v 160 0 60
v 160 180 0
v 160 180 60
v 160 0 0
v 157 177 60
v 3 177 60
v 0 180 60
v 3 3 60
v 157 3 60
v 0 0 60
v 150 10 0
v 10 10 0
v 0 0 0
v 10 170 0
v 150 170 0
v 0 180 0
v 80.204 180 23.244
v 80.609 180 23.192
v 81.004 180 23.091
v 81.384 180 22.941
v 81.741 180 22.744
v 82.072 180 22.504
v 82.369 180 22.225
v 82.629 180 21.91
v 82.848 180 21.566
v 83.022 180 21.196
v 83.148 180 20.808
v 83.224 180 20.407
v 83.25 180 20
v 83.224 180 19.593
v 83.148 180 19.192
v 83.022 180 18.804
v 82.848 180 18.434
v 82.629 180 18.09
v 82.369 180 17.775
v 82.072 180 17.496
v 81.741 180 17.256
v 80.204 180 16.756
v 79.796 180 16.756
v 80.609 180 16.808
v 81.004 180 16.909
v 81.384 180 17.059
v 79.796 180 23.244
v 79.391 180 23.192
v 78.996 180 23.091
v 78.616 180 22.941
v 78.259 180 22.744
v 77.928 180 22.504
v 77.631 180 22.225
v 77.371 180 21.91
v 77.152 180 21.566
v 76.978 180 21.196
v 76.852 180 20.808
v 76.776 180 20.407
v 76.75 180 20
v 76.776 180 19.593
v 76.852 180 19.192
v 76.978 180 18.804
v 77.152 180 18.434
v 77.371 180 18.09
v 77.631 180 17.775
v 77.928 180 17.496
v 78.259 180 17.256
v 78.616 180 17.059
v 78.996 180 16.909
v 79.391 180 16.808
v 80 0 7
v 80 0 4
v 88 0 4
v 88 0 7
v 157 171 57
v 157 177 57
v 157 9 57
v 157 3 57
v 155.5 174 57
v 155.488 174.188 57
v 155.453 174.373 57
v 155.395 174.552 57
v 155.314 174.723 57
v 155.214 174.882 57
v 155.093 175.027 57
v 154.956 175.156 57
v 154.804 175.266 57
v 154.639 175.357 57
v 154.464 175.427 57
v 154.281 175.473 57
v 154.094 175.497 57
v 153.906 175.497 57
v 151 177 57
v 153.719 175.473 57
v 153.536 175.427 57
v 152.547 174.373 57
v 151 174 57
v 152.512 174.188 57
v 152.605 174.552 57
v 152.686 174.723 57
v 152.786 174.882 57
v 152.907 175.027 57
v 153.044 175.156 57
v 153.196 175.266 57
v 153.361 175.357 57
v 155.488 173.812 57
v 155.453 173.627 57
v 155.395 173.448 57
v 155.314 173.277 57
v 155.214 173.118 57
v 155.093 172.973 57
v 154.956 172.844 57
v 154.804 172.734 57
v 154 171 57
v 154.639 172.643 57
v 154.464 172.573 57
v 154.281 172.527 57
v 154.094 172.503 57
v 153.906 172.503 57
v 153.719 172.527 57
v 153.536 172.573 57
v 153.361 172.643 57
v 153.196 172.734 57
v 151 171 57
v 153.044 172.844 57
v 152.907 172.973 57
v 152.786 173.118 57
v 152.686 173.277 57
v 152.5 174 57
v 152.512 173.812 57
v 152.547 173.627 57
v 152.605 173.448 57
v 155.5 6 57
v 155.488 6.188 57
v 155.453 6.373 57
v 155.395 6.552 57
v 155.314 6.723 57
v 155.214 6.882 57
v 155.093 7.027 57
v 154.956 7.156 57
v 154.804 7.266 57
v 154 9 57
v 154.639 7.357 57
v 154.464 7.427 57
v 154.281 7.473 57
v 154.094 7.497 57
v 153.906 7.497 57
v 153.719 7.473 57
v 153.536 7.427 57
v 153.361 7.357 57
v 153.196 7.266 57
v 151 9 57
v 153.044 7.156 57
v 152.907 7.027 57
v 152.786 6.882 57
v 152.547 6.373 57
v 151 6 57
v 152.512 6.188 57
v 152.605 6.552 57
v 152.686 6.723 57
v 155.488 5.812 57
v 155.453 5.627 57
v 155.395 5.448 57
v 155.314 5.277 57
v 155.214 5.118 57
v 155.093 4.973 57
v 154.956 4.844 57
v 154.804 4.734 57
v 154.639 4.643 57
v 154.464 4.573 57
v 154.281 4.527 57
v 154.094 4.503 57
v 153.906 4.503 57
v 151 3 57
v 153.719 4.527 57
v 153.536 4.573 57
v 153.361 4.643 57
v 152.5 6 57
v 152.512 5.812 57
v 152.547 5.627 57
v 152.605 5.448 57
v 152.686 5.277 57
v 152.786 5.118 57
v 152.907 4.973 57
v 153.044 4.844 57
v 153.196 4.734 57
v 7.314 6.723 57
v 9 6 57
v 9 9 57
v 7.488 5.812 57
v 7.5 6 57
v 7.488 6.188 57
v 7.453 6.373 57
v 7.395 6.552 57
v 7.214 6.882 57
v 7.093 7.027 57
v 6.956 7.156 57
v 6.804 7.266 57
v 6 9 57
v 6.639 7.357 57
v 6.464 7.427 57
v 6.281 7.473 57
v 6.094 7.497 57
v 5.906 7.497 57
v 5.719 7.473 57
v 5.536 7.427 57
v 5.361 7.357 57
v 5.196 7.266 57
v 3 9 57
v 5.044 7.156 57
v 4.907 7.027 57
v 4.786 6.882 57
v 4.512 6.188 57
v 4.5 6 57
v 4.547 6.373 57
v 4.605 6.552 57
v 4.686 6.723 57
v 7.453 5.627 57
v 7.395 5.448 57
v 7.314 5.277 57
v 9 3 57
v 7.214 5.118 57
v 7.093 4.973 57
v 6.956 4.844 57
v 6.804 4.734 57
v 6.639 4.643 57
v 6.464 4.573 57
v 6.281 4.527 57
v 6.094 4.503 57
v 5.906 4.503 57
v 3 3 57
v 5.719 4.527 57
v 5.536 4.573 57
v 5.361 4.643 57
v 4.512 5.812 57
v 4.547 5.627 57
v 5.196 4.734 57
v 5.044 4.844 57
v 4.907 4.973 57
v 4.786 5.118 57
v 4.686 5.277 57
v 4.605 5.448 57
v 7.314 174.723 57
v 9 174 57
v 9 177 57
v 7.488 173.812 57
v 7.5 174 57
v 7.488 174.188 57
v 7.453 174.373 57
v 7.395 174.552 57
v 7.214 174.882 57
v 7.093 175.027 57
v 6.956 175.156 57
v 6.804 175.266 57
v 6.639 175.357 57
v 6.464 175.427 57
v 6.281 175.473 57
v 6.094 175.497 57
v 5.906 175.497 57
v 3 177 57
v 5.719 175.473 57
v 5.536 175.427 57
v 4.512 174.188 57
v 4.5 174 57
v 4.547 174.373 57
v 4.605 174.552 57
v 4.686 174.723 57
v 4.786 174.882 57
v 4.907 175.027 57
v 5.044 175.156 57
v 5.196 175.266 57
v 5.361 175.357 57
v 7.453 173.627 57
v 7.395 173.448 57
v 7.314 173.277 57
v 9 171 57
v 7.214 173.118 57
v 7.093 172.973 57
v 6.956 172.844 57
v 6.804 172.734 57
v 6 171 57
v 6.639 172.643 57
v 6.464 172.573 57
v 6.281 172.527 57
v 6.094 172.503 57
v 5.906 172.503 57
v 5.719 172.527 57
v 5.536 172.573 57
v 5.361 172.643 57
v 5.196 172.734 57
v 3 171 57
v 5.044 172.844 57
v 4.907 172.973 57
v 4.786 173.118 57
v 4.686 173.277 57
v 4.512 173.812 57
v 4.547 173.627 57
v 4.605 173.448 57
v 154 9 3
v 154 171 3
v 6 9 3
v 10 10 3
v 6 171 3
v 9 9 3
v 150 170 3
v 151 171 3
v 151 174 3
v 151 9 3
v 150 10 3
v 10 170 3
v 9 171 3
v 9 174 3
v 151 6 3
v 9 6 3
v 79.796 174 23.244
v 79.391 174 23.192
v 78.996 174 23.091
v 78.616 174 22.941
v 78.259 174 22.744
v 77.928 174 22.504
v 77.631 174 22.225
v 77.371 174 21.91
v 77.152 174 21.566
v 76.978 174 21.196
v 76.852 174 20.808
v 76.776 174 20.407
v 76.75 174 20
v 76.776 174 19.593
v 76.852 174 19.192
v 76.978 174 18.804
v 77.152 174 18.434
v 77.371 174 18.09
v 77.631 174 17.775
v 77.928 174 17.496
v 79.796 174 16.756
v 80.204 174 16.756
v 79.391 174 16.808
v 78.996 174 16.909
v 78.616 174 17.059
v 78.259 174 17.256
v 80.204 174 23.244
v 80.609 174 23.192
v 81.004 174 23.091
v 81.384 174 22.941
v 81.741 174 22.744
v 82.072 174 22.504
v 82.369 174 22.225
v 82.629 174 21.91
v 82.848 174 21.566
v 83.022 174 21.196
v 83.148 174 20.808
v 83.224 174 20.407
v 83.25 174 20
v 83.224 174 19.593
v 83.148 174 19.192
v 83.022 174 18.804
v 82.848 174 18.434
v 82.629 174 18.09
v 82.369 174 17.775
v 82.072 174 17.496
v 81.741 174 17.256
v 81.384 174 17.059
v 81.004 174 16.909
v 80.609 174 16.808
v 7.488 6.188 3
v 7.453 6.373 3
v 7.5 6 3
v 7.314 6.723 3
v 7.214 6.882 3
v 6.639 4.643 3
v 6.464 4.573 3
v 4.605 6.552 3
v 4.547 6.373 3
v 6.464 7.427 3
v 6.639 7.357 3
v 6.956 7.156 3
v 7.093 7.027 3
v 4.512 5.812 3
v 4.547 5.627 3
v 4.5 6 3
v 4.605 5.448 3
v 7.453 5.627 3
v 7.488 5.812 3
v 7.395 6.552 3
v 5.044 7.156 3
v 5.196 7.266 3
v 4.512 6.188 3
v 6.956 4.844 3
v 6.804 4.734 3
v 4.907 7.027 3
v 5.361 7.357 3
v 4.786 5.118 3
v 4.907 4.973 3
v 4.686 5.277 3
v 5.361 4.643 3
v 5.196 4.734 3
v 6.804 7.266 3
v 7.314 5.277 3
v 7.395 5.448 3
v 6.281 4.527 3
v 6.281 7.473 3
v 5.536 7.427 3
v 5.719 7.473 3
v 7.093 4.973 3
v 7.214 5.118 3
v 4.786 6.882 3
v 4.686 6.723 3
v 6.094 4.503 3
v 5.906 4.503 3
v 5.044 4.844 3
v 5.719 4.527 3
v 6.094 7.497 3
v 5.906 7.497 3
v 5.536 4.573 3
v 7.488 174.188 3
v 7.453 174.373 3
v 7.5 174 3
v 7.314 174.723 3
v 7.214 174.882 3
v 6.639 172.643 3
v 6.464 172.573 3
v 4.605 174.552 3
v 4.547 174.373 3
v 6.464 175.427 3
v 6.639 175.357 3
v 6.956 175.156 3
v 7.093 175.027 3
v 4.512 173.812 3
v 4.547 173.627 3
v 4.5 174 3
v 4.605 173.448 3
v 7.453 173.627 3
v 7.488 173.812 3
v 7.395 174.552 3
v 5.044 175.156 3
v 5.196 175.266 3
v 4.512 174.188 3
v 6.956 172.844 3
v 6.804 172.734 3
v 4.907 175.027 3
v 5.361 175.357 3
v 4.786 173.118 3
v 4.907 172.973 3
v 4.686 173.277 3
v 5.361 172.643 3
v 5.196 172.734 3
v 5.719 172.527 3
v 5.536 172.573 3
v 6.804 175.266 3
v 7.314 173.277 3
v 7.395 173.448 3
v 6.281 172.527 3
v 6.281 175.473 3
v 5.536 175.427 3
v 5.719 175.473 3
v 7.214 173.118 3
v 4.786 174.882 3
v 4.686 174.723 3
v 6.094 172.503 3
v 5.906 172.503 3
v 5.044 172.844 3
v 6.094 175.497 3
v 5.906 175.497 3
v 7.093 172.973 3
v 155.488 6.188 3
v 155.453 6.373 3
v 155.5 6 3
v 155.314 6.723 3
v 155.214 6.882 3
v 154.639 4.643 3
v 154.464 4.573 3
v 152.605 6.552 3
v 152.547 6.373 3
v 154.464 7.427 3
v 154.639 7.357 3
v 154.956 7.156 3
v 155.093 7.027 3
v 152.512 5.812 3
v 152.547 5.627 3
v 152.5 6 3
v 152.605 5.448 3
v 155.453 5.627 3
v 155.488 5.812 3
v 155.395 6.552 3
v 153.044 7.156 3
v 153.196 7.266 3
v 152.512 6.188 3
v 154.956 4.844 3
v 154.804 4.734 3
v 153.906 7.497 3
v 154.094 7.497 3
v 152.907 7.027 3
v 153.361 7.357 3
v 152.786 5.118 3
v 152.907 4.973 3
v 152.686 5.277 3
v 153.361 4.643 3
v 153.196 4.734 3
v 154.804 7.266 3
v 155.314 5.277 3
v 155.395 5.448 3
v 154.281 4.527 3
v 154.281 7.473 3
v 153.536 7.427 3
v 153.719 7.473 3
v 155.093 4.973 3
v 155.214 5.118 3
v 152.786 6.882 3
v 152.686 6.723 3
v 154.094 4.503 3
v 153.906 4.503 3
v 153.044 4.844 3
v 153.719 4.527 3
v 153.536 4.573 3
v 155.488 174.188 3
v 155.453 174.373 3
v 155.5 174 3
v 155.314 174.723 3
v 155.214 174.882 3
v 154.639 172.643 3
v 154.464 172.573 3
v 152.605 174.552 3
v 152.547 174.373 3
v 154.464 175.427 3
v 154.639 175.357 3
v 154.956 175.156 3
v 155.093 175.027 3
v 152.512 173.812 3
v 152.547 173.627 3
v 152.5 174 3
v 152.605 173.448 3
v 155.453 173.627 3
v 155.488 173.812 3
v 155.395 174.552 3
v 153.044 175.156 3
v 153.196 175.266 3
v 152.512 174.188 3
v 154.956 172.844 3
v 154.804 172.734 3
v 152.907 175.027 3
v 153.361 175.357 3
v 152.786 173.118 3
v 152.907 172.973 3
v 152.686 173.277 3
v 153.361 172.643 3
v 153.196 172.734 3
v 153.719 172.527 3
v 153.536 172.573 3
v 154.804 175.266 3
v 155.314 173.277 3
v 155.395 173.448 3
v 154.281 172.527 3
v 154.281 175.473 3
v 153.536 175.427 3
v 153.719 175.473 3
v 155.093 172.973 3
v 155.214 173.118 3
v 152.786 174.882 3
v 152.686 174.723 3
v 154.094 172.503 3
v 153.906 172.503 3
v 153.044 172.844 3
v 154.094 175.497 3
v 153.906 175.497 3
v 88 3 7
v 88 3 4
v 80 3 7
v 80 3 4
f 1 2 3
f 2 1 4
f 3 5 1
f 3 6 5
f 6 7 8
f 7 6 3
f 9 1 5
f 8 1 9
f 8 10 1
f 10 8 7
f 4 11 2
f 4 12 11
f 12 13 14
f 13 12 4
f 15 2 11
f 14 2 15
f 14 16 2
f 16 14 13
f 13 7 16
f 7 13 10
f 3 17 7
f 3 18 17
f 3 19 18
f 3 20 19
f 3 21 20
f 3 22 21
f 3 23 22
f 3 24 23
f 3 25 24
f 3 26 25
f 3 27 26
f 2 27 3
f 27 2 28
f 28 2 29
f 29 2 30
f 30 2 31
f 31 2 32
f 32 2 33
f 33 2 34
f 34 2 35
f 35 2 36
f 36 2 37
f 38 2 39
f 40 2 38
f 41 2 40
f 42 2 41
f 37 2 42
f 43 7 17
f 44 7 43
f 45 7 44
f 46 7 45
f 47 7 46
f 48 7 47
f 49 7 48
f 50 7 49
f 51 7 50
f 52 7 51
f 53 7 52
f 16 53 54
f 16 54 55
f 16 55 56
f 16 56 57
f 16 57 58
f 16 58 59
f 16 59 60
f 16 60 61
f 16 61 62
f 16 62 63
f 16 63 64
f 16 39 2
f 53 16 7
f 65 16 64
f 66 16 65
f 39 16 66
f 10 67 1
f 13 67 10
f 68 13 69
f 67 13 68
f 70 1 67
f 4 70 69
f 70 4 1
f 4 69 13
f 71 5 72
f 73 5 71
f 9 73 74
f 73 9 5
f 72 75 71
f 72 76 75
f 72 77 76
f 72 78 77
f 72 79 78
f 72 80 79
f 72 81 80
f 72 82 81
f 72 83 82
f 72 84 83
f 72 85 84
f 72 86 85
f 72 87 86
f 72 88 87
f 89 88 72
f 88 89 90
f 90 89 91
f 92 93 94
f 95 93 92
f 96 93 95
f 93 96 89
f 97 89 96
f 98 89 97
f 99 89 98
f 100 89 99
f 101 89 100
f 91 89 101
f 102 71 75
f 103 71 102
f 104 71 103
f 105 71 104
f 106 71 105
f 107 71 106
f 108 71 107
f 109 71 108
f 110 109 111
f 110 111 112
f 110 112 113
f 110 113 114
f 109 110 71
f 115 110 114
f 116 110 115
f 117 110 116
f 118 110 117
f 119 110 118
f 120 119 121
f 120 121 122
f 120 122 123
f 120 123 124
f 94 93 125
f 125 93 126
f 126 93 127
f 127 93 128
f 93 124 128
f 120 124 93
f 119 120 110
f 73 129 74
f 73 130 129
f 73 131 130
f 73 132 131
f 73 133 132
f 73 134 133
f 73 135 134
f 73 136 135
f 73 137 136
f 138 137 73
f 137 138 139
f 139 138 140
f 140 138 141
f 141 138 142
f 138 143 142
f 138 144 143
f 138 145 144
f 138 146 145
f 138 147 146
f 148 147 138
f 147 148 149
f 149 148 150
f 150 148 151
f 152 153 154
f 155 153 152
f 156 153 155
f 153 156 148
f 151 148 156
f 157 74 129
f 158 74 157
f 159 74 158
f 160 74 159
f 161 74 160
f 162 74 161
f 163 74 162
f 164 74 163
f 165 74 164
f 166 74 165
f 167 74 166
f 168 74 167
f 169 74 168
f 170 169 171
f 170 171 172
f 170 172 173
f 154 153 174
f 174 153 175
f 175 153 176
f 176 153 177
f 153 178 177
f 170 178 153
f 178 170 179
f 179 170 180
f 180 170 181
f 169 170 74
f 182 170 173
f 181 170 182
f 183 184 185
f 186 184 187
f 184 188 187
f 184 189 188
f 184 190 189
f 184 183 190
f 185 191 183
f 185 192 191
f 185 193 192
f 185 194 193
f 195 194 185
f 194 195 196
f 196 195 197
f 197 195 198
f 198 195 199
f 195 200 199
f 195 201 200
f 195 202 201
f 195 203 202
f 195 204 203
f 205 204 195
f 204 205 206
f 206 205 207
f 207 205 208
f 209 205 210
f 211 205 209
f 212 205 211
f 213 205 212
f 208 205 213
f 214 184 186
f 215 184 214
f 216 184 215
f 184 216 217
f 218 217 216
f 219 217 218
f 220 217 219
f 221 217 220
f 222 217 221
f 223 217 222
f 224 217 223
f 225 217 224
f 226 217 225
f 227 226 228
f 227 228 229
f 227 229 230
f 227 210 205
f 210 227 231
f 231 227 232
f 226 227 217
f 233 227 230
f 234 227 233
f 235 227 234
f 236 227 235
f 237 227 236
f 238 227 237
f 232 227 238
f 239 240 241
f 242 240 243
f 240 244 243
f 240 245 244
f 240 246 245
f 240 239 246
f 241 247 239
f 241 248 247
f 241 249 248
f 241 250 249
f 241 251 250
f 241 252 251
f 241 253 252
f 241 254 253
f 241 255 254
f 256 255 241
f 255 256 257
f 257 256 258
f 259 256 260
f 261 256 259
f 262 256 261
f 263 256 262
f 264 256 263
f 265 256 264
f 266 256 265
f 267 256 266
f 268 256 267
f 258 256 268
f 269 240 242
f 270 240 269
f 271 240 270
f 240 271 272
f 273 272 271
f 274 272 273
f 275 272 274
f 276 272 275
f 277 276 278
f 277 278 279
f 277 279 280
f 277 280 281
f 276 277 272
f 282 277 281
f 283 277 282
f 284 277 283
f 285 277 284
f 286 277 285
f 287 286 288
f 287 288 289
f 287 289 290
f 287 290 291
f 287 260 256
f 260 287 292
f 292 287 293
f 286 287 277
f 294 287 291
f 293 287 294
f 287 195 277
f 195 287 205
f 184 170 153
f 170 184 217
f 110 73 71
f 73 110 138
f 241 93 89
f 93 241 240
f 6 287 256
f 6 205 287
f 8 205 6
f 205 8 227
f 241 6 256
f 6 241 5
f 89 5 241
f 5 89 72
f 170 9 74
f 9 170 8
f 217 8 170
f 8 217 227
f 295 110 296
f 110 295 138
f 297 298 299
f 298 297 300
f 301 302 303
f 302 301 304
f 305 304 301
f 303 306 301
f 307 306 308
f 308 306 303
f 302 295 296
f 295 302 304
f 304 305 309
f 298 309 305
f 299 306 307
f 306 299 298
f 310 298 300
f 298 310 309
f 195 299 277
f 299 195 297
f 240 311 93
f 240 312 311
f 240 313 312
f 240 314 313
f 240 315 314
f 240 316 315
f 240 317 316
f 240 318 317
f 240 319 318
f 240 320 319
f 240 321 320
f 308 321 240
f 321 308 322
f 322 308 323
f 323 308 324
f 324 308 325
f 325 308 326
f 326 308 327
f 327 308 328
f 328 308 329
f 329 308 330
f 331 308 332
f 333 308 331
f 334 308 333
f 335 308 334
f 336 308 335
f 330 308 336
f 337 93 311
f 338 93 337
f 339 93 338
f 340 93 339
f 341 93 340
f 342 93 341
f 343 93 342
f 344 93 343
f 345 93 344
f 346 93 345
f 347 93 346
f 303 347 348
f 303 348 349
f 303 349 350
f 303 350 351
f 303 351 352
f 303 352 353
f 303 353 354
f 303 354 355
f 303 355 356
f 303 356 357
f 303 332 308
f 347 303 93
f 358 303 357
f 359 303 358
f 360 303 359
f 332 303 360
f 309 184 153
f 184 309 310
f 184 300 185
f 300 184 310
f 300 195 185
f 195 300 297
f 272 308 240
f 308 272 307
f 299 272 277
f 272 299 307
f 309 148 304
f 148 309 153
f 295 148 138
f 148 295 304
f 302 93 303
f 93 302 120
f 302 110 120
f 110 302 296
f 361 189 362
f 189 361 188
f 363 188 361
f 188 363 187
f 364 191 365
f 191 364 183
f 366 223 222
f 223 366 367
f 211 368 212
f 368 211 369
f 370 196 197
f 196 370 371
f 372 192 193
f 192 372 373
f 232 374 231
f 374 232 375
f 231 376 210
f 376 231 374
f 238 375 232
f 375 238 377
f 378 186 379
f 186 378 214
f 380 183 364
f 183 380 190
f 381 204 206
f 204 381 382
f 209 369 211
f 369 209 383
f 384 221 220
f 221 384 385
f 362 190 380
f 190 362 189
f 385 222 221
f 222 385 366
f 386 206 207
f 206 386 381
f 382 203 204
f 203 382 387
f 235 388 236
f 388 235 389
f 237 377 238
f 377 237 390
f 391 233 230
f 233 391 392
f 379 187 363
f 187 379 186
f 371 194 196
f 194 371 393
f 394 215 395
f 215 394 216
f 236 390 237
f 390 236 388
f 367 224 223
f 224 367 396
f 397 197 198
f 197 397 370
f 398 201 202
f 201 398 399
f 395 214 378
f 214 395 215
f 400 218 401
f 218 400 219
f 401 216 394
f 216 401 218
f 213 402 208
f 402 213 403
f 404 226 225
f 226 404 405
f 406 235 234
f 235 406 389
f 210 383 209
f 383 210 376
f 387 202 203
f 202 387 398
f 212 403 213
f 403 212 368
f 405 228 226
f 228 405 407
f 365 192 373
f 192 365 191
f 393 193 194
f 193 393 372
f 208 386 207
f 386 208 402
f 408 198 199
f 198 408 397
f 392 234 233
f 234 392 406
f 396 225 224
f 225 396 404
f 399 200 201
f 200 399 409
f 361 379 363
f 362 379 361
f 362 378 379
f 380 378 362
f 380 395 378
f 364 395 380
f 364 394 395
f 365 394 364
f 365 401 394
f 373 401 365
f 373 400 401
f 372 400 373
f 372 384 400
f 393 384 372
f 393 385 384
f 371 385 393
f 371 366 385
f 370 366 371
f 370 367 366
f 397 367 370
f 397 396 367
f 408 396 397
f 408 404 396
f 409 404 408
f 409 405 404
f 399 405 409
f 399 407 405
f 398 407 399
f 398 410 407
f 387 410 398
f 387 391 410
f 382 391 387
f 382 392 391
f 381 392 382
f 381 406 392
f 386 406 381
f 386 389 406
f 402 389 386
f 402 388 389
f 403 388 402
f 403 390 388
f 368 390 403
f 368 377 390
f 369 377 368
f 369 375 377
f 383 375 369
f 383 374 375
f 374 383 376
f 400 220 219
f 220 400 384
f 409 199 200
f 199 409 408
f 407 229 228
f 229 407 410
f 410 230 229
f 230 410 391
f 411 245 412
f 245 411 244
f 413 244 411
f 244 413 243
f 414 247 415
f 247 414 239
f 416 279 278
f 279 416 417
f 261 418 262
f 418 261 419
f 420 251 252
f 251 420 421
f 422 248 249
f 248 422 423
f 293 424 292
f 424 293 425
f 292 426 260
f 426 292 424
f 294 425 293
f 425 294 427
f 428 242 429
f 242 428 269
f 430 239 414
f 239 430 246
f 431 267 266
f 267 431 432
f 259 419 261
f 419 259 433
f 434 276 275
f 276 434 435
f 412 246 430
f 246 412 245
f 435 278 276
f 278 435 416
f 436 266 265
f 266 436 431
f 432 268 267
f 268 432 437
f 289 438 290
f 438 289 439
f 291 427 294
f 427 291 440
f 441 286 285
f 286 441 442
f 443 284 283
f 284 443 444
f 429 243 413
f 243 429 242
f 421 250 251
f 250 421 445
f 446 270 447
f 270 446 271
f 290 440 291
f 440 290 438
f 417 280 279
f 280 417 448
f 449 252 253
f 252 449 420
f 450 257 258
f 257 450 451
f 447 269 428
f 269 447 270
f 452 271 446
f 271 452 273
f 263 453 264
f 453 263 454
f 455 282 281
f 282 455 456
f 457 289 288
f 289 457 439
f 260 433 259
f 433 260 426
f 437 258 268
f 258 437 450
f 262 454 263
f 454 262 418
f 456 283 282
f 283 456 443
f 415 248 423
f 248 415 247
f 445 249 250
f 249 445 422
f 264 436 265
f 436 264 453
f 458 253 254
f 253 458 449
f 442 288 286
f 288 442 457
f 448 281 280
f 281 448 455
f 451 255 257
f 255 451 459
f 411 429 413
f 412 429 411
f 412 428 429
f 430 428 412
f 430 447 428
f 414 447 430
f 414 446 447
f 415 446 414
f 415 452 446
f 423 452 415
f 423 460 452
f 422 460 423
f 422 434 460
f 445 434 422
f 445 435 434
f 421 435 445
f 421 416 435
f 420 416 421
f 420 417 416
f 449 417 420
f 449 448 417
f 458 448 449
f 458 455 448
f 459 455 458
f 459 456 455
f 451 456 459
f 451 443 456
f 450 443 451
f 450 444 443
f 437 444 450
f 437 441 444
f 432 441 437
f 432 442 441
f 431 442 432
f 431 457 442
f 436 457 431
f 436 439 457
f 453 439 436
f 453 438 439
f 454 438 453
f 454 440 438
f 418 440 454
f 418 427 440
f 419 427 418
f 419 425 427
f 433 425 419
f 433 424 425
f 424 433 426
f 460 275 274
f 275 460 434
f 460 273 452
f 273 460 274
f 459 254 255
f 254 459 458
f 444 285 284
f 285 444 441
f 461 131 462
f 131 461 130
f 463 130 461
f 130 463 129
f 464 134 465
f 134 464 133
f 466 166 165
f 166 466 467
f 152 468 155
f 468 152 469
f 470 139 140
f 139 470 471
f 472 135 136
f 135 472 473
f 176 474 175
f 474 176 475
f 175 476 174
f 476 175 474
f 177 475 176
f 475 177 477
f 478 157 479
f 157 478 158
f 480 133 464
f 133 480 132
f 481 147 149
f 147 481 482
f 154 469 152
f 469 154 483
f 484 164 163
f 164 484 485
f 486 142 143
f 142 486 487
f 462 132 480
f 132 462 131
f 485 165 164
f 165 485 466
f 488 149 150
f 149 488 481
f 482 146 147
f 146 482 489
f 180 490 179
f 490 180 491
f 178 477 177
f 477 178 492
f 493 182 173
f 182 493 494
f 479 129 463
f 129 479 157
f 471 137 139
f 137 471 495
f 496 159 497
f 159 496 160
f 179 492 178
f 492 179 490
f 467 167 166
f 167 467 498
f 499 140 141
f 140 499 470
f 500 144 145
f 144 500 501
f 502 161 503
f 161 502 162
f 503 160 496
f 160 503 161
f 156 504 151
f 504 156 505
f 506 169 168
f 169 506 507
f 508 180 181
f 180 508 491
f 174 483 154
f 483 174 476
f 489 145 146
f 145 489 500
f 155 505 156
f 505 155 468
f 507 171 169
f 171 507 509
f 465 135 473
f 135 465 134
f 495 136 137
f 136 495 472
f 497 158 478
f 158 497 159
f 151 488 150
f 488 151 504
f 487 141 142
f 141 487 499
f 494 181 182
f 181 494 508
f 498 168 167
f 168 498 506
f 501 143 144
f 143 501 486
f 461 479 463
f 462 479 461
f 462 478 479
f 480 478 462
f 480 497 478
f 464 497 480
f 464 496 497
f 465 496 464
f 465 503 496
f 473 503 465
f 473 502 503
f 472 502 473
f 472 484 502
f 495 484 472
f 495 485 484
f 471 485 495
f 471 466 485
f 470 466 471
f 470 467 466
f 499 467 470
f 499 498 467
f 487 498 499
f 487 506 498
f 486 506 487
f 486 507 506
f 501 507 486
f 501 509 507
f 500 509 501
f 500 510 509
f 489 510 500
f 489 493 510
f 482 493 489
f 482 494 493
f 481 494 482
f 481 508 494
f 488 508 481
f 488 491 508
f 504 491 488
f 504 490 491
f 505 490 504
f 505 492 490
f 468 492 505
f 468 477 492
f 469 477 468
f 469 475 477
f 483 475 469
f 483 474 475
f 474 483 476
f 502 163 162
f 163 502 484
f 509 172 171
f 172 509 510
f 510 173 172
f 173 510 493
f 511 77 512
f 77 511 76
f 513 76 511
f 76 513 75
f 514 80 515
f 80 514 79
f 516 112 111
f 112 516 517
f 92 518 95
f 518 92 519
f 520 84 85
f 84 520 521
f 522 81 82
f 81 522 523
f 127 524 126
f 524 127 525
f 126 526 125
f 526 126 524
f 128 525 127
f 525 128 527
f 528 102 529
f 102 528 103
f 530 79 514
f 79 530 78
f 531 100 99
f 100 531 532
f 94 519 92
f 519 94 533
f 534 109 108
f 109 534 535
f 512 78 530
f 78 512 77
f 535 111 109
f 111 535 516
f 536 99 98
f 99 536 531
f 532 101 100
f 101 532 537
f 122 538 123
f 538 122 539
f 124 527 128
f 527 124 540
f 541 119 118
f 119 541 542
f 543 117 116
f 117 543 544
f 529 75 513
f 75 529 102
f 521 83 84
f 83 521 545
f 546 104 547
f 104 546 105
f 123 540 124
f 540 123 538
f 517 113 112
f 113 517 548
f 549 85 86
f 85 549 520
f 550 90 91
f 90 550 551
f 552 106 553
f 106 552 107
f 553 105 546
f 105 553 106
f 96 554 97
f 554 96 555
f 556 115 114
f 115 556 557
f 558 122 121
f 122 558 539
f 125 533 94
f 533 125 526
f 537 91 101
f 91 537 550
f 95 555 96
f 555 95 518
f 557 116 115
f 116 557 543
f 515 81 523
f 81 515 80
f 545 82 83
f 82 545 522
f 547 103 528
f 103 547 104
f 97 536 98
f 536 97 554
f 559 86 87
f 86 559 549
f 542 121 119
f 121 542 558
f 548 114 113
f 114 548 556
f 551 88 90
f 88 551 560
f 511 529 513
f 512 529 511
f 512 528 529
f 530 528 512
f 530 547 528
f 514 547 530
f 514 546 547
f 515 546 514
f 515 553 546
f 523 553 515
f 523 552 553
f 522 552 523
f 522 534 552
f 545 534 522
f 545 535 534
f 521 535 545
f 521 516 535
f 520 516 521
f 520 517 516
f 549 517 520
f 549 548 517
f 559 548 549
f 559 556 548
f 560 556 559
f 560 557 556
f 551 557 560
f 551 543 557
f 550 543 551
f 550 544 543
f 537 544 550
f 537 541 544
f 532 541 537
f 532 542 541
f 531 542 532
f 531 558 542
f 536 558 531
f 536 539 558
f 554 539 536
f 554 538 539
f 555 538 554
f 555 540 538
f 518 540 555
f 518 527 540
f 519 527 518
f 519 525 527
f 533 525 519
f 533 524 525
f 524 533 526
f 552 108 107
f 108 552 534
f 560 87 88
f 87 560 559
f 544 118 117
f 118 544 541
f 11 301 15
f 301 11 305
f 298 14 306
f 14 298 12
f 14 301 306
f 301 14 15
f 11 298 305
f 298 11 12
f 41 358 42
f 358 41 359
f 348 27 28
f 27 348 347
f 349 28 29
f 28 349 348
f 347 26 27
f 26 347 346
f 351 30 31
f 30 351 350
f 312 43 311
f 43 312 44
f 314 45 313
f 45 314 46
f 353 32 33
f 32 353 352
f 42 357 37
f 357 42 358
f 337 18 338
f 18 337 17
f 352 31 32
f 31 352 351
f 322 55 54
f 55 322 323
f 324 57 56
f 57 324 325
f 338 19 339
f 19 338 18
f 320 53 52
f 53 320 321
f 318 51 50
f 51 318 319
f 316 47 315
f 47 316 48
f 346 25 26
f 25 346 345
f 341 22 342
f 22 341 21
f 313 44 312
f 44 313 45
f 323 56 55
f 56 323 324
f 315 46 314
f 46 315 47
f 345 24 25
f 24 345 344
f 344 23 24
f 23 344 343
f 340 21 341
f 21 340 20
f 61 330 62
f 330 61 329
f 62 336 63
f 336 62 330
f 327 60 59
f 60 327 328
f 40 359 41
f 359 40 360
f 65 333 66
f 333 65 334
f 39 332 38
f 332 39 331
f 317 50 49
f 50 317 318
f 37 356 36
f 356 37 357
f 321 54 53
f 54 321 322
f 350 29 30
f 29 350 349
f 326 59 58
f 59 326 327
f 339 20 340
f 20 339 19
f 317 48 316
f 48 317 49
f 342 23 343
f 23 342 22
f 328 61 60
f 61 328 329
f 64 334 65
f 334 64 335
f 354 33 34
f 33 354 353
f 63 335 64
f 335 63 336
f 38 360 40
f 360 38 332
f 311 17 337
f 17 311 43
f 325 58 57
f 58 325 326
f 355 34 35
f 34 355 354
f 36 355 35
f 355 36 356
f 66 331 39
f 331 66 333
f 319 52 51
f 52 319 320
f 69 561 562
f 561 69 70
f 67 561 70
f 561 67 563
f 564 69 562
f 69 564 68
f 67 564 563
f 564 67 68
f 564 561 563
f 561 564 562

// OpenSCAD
// file: constants.scad
//------------------------------------------------------------------------------
// constants.scad -- global and cross-file constants.
//
// _xx: width
// _yy: depth
// _zz: height
// _dd: diameter
//
// This is part of the ArrBot EastBay Transmitter project.
// https://github.com/marhar/eastbay-transmitter
// Copyright (c) 2020 Google LLC
//------------------------------------------------------------------------------

$fn=50;

box_xx = 160;            // main box
box_yy = 180;
box_zz = 60;
wall = 3;

post_wid = 6;

plate_zz = 3;

screw3a_dd = 3.0;       // mounting screw
screw3b_dd = 3.2;

button_dd = 8.1;        // hole size for button
switch_dd = 8.1;        // hole size for switch and button

power_dd = 12;          // power switch

antenna_dd = 44;        // antenna_hole (TODO);
// main file
//------------------------------------------------------------------------------
// case.scad -- main transmitter box.
//
// This is part of the ArrBot EastBay Transmitter project.
// https://github.com/marhar/eastbay-transmitter
// Copyright (c) 2020 Google LLC
//------------------------------------------------------------------------------

include <constants.scad>

module post(hh) {
  // post for screwing faceplace onto case.
  cube([post_wid, post_wid, hh]);
}
module posthole(hh) {
  // screwhole for post.
  translate([post_wid/2,post_wid/2,0]) cylinder(hh, d=screw3a_dd);
}

module case() {
  // main case without sideholes.
  difference() {
    union() {
      difference() {
        cube([box_xx, box_yy, box_zz]);
        translate([wall,wall,box_zz-plate_zz]) cube([box_xx-2*wall,box_yy-2*wall,plate_zz]);
        translate([wall*2,wall*2,wall]) cube([box_xx-4*wall,box_yy-4*wall,box_zz-wall]);
      }
      // posts
      for (i=[wall,box_xx-wall-post_wid], j=[wall,box_yy-wall-post_wid]) {
        translate([i,j,wall]) post(box_zz-wall-plate_zz);
      }
    }
    //post holes
    for (i=[wall,box_xx-wall-post_wid], j=[wall,box_yy-wall-post_wid]) {
      translate([i,j,wall]) posthole(box_zz-wall-plate_zz);
    }
    // cutout on bottom for quicker prototype printing.  Comment out for final.
    translate([10,10,0]) cube([box_xx-20,box_yy-20,wall]);
  }
}

antenna_hole_dd = 6.5;

module antenna_hole() {
  cylinder(wall*2,d=antenna_hole_dd);
}

module charger_hole() {
  // micro usb size?
  cube([8,wall,3]);
}

module holed_case() {
  difference() {
    case();
    #translate([box_xx/2,box_yy, box_zz*1/3]) rotate([90,0,0]) antenna_hole();
    #translate([box_xx/2,0,wall+1]) charger_hole();
  }
}

holed_case();
